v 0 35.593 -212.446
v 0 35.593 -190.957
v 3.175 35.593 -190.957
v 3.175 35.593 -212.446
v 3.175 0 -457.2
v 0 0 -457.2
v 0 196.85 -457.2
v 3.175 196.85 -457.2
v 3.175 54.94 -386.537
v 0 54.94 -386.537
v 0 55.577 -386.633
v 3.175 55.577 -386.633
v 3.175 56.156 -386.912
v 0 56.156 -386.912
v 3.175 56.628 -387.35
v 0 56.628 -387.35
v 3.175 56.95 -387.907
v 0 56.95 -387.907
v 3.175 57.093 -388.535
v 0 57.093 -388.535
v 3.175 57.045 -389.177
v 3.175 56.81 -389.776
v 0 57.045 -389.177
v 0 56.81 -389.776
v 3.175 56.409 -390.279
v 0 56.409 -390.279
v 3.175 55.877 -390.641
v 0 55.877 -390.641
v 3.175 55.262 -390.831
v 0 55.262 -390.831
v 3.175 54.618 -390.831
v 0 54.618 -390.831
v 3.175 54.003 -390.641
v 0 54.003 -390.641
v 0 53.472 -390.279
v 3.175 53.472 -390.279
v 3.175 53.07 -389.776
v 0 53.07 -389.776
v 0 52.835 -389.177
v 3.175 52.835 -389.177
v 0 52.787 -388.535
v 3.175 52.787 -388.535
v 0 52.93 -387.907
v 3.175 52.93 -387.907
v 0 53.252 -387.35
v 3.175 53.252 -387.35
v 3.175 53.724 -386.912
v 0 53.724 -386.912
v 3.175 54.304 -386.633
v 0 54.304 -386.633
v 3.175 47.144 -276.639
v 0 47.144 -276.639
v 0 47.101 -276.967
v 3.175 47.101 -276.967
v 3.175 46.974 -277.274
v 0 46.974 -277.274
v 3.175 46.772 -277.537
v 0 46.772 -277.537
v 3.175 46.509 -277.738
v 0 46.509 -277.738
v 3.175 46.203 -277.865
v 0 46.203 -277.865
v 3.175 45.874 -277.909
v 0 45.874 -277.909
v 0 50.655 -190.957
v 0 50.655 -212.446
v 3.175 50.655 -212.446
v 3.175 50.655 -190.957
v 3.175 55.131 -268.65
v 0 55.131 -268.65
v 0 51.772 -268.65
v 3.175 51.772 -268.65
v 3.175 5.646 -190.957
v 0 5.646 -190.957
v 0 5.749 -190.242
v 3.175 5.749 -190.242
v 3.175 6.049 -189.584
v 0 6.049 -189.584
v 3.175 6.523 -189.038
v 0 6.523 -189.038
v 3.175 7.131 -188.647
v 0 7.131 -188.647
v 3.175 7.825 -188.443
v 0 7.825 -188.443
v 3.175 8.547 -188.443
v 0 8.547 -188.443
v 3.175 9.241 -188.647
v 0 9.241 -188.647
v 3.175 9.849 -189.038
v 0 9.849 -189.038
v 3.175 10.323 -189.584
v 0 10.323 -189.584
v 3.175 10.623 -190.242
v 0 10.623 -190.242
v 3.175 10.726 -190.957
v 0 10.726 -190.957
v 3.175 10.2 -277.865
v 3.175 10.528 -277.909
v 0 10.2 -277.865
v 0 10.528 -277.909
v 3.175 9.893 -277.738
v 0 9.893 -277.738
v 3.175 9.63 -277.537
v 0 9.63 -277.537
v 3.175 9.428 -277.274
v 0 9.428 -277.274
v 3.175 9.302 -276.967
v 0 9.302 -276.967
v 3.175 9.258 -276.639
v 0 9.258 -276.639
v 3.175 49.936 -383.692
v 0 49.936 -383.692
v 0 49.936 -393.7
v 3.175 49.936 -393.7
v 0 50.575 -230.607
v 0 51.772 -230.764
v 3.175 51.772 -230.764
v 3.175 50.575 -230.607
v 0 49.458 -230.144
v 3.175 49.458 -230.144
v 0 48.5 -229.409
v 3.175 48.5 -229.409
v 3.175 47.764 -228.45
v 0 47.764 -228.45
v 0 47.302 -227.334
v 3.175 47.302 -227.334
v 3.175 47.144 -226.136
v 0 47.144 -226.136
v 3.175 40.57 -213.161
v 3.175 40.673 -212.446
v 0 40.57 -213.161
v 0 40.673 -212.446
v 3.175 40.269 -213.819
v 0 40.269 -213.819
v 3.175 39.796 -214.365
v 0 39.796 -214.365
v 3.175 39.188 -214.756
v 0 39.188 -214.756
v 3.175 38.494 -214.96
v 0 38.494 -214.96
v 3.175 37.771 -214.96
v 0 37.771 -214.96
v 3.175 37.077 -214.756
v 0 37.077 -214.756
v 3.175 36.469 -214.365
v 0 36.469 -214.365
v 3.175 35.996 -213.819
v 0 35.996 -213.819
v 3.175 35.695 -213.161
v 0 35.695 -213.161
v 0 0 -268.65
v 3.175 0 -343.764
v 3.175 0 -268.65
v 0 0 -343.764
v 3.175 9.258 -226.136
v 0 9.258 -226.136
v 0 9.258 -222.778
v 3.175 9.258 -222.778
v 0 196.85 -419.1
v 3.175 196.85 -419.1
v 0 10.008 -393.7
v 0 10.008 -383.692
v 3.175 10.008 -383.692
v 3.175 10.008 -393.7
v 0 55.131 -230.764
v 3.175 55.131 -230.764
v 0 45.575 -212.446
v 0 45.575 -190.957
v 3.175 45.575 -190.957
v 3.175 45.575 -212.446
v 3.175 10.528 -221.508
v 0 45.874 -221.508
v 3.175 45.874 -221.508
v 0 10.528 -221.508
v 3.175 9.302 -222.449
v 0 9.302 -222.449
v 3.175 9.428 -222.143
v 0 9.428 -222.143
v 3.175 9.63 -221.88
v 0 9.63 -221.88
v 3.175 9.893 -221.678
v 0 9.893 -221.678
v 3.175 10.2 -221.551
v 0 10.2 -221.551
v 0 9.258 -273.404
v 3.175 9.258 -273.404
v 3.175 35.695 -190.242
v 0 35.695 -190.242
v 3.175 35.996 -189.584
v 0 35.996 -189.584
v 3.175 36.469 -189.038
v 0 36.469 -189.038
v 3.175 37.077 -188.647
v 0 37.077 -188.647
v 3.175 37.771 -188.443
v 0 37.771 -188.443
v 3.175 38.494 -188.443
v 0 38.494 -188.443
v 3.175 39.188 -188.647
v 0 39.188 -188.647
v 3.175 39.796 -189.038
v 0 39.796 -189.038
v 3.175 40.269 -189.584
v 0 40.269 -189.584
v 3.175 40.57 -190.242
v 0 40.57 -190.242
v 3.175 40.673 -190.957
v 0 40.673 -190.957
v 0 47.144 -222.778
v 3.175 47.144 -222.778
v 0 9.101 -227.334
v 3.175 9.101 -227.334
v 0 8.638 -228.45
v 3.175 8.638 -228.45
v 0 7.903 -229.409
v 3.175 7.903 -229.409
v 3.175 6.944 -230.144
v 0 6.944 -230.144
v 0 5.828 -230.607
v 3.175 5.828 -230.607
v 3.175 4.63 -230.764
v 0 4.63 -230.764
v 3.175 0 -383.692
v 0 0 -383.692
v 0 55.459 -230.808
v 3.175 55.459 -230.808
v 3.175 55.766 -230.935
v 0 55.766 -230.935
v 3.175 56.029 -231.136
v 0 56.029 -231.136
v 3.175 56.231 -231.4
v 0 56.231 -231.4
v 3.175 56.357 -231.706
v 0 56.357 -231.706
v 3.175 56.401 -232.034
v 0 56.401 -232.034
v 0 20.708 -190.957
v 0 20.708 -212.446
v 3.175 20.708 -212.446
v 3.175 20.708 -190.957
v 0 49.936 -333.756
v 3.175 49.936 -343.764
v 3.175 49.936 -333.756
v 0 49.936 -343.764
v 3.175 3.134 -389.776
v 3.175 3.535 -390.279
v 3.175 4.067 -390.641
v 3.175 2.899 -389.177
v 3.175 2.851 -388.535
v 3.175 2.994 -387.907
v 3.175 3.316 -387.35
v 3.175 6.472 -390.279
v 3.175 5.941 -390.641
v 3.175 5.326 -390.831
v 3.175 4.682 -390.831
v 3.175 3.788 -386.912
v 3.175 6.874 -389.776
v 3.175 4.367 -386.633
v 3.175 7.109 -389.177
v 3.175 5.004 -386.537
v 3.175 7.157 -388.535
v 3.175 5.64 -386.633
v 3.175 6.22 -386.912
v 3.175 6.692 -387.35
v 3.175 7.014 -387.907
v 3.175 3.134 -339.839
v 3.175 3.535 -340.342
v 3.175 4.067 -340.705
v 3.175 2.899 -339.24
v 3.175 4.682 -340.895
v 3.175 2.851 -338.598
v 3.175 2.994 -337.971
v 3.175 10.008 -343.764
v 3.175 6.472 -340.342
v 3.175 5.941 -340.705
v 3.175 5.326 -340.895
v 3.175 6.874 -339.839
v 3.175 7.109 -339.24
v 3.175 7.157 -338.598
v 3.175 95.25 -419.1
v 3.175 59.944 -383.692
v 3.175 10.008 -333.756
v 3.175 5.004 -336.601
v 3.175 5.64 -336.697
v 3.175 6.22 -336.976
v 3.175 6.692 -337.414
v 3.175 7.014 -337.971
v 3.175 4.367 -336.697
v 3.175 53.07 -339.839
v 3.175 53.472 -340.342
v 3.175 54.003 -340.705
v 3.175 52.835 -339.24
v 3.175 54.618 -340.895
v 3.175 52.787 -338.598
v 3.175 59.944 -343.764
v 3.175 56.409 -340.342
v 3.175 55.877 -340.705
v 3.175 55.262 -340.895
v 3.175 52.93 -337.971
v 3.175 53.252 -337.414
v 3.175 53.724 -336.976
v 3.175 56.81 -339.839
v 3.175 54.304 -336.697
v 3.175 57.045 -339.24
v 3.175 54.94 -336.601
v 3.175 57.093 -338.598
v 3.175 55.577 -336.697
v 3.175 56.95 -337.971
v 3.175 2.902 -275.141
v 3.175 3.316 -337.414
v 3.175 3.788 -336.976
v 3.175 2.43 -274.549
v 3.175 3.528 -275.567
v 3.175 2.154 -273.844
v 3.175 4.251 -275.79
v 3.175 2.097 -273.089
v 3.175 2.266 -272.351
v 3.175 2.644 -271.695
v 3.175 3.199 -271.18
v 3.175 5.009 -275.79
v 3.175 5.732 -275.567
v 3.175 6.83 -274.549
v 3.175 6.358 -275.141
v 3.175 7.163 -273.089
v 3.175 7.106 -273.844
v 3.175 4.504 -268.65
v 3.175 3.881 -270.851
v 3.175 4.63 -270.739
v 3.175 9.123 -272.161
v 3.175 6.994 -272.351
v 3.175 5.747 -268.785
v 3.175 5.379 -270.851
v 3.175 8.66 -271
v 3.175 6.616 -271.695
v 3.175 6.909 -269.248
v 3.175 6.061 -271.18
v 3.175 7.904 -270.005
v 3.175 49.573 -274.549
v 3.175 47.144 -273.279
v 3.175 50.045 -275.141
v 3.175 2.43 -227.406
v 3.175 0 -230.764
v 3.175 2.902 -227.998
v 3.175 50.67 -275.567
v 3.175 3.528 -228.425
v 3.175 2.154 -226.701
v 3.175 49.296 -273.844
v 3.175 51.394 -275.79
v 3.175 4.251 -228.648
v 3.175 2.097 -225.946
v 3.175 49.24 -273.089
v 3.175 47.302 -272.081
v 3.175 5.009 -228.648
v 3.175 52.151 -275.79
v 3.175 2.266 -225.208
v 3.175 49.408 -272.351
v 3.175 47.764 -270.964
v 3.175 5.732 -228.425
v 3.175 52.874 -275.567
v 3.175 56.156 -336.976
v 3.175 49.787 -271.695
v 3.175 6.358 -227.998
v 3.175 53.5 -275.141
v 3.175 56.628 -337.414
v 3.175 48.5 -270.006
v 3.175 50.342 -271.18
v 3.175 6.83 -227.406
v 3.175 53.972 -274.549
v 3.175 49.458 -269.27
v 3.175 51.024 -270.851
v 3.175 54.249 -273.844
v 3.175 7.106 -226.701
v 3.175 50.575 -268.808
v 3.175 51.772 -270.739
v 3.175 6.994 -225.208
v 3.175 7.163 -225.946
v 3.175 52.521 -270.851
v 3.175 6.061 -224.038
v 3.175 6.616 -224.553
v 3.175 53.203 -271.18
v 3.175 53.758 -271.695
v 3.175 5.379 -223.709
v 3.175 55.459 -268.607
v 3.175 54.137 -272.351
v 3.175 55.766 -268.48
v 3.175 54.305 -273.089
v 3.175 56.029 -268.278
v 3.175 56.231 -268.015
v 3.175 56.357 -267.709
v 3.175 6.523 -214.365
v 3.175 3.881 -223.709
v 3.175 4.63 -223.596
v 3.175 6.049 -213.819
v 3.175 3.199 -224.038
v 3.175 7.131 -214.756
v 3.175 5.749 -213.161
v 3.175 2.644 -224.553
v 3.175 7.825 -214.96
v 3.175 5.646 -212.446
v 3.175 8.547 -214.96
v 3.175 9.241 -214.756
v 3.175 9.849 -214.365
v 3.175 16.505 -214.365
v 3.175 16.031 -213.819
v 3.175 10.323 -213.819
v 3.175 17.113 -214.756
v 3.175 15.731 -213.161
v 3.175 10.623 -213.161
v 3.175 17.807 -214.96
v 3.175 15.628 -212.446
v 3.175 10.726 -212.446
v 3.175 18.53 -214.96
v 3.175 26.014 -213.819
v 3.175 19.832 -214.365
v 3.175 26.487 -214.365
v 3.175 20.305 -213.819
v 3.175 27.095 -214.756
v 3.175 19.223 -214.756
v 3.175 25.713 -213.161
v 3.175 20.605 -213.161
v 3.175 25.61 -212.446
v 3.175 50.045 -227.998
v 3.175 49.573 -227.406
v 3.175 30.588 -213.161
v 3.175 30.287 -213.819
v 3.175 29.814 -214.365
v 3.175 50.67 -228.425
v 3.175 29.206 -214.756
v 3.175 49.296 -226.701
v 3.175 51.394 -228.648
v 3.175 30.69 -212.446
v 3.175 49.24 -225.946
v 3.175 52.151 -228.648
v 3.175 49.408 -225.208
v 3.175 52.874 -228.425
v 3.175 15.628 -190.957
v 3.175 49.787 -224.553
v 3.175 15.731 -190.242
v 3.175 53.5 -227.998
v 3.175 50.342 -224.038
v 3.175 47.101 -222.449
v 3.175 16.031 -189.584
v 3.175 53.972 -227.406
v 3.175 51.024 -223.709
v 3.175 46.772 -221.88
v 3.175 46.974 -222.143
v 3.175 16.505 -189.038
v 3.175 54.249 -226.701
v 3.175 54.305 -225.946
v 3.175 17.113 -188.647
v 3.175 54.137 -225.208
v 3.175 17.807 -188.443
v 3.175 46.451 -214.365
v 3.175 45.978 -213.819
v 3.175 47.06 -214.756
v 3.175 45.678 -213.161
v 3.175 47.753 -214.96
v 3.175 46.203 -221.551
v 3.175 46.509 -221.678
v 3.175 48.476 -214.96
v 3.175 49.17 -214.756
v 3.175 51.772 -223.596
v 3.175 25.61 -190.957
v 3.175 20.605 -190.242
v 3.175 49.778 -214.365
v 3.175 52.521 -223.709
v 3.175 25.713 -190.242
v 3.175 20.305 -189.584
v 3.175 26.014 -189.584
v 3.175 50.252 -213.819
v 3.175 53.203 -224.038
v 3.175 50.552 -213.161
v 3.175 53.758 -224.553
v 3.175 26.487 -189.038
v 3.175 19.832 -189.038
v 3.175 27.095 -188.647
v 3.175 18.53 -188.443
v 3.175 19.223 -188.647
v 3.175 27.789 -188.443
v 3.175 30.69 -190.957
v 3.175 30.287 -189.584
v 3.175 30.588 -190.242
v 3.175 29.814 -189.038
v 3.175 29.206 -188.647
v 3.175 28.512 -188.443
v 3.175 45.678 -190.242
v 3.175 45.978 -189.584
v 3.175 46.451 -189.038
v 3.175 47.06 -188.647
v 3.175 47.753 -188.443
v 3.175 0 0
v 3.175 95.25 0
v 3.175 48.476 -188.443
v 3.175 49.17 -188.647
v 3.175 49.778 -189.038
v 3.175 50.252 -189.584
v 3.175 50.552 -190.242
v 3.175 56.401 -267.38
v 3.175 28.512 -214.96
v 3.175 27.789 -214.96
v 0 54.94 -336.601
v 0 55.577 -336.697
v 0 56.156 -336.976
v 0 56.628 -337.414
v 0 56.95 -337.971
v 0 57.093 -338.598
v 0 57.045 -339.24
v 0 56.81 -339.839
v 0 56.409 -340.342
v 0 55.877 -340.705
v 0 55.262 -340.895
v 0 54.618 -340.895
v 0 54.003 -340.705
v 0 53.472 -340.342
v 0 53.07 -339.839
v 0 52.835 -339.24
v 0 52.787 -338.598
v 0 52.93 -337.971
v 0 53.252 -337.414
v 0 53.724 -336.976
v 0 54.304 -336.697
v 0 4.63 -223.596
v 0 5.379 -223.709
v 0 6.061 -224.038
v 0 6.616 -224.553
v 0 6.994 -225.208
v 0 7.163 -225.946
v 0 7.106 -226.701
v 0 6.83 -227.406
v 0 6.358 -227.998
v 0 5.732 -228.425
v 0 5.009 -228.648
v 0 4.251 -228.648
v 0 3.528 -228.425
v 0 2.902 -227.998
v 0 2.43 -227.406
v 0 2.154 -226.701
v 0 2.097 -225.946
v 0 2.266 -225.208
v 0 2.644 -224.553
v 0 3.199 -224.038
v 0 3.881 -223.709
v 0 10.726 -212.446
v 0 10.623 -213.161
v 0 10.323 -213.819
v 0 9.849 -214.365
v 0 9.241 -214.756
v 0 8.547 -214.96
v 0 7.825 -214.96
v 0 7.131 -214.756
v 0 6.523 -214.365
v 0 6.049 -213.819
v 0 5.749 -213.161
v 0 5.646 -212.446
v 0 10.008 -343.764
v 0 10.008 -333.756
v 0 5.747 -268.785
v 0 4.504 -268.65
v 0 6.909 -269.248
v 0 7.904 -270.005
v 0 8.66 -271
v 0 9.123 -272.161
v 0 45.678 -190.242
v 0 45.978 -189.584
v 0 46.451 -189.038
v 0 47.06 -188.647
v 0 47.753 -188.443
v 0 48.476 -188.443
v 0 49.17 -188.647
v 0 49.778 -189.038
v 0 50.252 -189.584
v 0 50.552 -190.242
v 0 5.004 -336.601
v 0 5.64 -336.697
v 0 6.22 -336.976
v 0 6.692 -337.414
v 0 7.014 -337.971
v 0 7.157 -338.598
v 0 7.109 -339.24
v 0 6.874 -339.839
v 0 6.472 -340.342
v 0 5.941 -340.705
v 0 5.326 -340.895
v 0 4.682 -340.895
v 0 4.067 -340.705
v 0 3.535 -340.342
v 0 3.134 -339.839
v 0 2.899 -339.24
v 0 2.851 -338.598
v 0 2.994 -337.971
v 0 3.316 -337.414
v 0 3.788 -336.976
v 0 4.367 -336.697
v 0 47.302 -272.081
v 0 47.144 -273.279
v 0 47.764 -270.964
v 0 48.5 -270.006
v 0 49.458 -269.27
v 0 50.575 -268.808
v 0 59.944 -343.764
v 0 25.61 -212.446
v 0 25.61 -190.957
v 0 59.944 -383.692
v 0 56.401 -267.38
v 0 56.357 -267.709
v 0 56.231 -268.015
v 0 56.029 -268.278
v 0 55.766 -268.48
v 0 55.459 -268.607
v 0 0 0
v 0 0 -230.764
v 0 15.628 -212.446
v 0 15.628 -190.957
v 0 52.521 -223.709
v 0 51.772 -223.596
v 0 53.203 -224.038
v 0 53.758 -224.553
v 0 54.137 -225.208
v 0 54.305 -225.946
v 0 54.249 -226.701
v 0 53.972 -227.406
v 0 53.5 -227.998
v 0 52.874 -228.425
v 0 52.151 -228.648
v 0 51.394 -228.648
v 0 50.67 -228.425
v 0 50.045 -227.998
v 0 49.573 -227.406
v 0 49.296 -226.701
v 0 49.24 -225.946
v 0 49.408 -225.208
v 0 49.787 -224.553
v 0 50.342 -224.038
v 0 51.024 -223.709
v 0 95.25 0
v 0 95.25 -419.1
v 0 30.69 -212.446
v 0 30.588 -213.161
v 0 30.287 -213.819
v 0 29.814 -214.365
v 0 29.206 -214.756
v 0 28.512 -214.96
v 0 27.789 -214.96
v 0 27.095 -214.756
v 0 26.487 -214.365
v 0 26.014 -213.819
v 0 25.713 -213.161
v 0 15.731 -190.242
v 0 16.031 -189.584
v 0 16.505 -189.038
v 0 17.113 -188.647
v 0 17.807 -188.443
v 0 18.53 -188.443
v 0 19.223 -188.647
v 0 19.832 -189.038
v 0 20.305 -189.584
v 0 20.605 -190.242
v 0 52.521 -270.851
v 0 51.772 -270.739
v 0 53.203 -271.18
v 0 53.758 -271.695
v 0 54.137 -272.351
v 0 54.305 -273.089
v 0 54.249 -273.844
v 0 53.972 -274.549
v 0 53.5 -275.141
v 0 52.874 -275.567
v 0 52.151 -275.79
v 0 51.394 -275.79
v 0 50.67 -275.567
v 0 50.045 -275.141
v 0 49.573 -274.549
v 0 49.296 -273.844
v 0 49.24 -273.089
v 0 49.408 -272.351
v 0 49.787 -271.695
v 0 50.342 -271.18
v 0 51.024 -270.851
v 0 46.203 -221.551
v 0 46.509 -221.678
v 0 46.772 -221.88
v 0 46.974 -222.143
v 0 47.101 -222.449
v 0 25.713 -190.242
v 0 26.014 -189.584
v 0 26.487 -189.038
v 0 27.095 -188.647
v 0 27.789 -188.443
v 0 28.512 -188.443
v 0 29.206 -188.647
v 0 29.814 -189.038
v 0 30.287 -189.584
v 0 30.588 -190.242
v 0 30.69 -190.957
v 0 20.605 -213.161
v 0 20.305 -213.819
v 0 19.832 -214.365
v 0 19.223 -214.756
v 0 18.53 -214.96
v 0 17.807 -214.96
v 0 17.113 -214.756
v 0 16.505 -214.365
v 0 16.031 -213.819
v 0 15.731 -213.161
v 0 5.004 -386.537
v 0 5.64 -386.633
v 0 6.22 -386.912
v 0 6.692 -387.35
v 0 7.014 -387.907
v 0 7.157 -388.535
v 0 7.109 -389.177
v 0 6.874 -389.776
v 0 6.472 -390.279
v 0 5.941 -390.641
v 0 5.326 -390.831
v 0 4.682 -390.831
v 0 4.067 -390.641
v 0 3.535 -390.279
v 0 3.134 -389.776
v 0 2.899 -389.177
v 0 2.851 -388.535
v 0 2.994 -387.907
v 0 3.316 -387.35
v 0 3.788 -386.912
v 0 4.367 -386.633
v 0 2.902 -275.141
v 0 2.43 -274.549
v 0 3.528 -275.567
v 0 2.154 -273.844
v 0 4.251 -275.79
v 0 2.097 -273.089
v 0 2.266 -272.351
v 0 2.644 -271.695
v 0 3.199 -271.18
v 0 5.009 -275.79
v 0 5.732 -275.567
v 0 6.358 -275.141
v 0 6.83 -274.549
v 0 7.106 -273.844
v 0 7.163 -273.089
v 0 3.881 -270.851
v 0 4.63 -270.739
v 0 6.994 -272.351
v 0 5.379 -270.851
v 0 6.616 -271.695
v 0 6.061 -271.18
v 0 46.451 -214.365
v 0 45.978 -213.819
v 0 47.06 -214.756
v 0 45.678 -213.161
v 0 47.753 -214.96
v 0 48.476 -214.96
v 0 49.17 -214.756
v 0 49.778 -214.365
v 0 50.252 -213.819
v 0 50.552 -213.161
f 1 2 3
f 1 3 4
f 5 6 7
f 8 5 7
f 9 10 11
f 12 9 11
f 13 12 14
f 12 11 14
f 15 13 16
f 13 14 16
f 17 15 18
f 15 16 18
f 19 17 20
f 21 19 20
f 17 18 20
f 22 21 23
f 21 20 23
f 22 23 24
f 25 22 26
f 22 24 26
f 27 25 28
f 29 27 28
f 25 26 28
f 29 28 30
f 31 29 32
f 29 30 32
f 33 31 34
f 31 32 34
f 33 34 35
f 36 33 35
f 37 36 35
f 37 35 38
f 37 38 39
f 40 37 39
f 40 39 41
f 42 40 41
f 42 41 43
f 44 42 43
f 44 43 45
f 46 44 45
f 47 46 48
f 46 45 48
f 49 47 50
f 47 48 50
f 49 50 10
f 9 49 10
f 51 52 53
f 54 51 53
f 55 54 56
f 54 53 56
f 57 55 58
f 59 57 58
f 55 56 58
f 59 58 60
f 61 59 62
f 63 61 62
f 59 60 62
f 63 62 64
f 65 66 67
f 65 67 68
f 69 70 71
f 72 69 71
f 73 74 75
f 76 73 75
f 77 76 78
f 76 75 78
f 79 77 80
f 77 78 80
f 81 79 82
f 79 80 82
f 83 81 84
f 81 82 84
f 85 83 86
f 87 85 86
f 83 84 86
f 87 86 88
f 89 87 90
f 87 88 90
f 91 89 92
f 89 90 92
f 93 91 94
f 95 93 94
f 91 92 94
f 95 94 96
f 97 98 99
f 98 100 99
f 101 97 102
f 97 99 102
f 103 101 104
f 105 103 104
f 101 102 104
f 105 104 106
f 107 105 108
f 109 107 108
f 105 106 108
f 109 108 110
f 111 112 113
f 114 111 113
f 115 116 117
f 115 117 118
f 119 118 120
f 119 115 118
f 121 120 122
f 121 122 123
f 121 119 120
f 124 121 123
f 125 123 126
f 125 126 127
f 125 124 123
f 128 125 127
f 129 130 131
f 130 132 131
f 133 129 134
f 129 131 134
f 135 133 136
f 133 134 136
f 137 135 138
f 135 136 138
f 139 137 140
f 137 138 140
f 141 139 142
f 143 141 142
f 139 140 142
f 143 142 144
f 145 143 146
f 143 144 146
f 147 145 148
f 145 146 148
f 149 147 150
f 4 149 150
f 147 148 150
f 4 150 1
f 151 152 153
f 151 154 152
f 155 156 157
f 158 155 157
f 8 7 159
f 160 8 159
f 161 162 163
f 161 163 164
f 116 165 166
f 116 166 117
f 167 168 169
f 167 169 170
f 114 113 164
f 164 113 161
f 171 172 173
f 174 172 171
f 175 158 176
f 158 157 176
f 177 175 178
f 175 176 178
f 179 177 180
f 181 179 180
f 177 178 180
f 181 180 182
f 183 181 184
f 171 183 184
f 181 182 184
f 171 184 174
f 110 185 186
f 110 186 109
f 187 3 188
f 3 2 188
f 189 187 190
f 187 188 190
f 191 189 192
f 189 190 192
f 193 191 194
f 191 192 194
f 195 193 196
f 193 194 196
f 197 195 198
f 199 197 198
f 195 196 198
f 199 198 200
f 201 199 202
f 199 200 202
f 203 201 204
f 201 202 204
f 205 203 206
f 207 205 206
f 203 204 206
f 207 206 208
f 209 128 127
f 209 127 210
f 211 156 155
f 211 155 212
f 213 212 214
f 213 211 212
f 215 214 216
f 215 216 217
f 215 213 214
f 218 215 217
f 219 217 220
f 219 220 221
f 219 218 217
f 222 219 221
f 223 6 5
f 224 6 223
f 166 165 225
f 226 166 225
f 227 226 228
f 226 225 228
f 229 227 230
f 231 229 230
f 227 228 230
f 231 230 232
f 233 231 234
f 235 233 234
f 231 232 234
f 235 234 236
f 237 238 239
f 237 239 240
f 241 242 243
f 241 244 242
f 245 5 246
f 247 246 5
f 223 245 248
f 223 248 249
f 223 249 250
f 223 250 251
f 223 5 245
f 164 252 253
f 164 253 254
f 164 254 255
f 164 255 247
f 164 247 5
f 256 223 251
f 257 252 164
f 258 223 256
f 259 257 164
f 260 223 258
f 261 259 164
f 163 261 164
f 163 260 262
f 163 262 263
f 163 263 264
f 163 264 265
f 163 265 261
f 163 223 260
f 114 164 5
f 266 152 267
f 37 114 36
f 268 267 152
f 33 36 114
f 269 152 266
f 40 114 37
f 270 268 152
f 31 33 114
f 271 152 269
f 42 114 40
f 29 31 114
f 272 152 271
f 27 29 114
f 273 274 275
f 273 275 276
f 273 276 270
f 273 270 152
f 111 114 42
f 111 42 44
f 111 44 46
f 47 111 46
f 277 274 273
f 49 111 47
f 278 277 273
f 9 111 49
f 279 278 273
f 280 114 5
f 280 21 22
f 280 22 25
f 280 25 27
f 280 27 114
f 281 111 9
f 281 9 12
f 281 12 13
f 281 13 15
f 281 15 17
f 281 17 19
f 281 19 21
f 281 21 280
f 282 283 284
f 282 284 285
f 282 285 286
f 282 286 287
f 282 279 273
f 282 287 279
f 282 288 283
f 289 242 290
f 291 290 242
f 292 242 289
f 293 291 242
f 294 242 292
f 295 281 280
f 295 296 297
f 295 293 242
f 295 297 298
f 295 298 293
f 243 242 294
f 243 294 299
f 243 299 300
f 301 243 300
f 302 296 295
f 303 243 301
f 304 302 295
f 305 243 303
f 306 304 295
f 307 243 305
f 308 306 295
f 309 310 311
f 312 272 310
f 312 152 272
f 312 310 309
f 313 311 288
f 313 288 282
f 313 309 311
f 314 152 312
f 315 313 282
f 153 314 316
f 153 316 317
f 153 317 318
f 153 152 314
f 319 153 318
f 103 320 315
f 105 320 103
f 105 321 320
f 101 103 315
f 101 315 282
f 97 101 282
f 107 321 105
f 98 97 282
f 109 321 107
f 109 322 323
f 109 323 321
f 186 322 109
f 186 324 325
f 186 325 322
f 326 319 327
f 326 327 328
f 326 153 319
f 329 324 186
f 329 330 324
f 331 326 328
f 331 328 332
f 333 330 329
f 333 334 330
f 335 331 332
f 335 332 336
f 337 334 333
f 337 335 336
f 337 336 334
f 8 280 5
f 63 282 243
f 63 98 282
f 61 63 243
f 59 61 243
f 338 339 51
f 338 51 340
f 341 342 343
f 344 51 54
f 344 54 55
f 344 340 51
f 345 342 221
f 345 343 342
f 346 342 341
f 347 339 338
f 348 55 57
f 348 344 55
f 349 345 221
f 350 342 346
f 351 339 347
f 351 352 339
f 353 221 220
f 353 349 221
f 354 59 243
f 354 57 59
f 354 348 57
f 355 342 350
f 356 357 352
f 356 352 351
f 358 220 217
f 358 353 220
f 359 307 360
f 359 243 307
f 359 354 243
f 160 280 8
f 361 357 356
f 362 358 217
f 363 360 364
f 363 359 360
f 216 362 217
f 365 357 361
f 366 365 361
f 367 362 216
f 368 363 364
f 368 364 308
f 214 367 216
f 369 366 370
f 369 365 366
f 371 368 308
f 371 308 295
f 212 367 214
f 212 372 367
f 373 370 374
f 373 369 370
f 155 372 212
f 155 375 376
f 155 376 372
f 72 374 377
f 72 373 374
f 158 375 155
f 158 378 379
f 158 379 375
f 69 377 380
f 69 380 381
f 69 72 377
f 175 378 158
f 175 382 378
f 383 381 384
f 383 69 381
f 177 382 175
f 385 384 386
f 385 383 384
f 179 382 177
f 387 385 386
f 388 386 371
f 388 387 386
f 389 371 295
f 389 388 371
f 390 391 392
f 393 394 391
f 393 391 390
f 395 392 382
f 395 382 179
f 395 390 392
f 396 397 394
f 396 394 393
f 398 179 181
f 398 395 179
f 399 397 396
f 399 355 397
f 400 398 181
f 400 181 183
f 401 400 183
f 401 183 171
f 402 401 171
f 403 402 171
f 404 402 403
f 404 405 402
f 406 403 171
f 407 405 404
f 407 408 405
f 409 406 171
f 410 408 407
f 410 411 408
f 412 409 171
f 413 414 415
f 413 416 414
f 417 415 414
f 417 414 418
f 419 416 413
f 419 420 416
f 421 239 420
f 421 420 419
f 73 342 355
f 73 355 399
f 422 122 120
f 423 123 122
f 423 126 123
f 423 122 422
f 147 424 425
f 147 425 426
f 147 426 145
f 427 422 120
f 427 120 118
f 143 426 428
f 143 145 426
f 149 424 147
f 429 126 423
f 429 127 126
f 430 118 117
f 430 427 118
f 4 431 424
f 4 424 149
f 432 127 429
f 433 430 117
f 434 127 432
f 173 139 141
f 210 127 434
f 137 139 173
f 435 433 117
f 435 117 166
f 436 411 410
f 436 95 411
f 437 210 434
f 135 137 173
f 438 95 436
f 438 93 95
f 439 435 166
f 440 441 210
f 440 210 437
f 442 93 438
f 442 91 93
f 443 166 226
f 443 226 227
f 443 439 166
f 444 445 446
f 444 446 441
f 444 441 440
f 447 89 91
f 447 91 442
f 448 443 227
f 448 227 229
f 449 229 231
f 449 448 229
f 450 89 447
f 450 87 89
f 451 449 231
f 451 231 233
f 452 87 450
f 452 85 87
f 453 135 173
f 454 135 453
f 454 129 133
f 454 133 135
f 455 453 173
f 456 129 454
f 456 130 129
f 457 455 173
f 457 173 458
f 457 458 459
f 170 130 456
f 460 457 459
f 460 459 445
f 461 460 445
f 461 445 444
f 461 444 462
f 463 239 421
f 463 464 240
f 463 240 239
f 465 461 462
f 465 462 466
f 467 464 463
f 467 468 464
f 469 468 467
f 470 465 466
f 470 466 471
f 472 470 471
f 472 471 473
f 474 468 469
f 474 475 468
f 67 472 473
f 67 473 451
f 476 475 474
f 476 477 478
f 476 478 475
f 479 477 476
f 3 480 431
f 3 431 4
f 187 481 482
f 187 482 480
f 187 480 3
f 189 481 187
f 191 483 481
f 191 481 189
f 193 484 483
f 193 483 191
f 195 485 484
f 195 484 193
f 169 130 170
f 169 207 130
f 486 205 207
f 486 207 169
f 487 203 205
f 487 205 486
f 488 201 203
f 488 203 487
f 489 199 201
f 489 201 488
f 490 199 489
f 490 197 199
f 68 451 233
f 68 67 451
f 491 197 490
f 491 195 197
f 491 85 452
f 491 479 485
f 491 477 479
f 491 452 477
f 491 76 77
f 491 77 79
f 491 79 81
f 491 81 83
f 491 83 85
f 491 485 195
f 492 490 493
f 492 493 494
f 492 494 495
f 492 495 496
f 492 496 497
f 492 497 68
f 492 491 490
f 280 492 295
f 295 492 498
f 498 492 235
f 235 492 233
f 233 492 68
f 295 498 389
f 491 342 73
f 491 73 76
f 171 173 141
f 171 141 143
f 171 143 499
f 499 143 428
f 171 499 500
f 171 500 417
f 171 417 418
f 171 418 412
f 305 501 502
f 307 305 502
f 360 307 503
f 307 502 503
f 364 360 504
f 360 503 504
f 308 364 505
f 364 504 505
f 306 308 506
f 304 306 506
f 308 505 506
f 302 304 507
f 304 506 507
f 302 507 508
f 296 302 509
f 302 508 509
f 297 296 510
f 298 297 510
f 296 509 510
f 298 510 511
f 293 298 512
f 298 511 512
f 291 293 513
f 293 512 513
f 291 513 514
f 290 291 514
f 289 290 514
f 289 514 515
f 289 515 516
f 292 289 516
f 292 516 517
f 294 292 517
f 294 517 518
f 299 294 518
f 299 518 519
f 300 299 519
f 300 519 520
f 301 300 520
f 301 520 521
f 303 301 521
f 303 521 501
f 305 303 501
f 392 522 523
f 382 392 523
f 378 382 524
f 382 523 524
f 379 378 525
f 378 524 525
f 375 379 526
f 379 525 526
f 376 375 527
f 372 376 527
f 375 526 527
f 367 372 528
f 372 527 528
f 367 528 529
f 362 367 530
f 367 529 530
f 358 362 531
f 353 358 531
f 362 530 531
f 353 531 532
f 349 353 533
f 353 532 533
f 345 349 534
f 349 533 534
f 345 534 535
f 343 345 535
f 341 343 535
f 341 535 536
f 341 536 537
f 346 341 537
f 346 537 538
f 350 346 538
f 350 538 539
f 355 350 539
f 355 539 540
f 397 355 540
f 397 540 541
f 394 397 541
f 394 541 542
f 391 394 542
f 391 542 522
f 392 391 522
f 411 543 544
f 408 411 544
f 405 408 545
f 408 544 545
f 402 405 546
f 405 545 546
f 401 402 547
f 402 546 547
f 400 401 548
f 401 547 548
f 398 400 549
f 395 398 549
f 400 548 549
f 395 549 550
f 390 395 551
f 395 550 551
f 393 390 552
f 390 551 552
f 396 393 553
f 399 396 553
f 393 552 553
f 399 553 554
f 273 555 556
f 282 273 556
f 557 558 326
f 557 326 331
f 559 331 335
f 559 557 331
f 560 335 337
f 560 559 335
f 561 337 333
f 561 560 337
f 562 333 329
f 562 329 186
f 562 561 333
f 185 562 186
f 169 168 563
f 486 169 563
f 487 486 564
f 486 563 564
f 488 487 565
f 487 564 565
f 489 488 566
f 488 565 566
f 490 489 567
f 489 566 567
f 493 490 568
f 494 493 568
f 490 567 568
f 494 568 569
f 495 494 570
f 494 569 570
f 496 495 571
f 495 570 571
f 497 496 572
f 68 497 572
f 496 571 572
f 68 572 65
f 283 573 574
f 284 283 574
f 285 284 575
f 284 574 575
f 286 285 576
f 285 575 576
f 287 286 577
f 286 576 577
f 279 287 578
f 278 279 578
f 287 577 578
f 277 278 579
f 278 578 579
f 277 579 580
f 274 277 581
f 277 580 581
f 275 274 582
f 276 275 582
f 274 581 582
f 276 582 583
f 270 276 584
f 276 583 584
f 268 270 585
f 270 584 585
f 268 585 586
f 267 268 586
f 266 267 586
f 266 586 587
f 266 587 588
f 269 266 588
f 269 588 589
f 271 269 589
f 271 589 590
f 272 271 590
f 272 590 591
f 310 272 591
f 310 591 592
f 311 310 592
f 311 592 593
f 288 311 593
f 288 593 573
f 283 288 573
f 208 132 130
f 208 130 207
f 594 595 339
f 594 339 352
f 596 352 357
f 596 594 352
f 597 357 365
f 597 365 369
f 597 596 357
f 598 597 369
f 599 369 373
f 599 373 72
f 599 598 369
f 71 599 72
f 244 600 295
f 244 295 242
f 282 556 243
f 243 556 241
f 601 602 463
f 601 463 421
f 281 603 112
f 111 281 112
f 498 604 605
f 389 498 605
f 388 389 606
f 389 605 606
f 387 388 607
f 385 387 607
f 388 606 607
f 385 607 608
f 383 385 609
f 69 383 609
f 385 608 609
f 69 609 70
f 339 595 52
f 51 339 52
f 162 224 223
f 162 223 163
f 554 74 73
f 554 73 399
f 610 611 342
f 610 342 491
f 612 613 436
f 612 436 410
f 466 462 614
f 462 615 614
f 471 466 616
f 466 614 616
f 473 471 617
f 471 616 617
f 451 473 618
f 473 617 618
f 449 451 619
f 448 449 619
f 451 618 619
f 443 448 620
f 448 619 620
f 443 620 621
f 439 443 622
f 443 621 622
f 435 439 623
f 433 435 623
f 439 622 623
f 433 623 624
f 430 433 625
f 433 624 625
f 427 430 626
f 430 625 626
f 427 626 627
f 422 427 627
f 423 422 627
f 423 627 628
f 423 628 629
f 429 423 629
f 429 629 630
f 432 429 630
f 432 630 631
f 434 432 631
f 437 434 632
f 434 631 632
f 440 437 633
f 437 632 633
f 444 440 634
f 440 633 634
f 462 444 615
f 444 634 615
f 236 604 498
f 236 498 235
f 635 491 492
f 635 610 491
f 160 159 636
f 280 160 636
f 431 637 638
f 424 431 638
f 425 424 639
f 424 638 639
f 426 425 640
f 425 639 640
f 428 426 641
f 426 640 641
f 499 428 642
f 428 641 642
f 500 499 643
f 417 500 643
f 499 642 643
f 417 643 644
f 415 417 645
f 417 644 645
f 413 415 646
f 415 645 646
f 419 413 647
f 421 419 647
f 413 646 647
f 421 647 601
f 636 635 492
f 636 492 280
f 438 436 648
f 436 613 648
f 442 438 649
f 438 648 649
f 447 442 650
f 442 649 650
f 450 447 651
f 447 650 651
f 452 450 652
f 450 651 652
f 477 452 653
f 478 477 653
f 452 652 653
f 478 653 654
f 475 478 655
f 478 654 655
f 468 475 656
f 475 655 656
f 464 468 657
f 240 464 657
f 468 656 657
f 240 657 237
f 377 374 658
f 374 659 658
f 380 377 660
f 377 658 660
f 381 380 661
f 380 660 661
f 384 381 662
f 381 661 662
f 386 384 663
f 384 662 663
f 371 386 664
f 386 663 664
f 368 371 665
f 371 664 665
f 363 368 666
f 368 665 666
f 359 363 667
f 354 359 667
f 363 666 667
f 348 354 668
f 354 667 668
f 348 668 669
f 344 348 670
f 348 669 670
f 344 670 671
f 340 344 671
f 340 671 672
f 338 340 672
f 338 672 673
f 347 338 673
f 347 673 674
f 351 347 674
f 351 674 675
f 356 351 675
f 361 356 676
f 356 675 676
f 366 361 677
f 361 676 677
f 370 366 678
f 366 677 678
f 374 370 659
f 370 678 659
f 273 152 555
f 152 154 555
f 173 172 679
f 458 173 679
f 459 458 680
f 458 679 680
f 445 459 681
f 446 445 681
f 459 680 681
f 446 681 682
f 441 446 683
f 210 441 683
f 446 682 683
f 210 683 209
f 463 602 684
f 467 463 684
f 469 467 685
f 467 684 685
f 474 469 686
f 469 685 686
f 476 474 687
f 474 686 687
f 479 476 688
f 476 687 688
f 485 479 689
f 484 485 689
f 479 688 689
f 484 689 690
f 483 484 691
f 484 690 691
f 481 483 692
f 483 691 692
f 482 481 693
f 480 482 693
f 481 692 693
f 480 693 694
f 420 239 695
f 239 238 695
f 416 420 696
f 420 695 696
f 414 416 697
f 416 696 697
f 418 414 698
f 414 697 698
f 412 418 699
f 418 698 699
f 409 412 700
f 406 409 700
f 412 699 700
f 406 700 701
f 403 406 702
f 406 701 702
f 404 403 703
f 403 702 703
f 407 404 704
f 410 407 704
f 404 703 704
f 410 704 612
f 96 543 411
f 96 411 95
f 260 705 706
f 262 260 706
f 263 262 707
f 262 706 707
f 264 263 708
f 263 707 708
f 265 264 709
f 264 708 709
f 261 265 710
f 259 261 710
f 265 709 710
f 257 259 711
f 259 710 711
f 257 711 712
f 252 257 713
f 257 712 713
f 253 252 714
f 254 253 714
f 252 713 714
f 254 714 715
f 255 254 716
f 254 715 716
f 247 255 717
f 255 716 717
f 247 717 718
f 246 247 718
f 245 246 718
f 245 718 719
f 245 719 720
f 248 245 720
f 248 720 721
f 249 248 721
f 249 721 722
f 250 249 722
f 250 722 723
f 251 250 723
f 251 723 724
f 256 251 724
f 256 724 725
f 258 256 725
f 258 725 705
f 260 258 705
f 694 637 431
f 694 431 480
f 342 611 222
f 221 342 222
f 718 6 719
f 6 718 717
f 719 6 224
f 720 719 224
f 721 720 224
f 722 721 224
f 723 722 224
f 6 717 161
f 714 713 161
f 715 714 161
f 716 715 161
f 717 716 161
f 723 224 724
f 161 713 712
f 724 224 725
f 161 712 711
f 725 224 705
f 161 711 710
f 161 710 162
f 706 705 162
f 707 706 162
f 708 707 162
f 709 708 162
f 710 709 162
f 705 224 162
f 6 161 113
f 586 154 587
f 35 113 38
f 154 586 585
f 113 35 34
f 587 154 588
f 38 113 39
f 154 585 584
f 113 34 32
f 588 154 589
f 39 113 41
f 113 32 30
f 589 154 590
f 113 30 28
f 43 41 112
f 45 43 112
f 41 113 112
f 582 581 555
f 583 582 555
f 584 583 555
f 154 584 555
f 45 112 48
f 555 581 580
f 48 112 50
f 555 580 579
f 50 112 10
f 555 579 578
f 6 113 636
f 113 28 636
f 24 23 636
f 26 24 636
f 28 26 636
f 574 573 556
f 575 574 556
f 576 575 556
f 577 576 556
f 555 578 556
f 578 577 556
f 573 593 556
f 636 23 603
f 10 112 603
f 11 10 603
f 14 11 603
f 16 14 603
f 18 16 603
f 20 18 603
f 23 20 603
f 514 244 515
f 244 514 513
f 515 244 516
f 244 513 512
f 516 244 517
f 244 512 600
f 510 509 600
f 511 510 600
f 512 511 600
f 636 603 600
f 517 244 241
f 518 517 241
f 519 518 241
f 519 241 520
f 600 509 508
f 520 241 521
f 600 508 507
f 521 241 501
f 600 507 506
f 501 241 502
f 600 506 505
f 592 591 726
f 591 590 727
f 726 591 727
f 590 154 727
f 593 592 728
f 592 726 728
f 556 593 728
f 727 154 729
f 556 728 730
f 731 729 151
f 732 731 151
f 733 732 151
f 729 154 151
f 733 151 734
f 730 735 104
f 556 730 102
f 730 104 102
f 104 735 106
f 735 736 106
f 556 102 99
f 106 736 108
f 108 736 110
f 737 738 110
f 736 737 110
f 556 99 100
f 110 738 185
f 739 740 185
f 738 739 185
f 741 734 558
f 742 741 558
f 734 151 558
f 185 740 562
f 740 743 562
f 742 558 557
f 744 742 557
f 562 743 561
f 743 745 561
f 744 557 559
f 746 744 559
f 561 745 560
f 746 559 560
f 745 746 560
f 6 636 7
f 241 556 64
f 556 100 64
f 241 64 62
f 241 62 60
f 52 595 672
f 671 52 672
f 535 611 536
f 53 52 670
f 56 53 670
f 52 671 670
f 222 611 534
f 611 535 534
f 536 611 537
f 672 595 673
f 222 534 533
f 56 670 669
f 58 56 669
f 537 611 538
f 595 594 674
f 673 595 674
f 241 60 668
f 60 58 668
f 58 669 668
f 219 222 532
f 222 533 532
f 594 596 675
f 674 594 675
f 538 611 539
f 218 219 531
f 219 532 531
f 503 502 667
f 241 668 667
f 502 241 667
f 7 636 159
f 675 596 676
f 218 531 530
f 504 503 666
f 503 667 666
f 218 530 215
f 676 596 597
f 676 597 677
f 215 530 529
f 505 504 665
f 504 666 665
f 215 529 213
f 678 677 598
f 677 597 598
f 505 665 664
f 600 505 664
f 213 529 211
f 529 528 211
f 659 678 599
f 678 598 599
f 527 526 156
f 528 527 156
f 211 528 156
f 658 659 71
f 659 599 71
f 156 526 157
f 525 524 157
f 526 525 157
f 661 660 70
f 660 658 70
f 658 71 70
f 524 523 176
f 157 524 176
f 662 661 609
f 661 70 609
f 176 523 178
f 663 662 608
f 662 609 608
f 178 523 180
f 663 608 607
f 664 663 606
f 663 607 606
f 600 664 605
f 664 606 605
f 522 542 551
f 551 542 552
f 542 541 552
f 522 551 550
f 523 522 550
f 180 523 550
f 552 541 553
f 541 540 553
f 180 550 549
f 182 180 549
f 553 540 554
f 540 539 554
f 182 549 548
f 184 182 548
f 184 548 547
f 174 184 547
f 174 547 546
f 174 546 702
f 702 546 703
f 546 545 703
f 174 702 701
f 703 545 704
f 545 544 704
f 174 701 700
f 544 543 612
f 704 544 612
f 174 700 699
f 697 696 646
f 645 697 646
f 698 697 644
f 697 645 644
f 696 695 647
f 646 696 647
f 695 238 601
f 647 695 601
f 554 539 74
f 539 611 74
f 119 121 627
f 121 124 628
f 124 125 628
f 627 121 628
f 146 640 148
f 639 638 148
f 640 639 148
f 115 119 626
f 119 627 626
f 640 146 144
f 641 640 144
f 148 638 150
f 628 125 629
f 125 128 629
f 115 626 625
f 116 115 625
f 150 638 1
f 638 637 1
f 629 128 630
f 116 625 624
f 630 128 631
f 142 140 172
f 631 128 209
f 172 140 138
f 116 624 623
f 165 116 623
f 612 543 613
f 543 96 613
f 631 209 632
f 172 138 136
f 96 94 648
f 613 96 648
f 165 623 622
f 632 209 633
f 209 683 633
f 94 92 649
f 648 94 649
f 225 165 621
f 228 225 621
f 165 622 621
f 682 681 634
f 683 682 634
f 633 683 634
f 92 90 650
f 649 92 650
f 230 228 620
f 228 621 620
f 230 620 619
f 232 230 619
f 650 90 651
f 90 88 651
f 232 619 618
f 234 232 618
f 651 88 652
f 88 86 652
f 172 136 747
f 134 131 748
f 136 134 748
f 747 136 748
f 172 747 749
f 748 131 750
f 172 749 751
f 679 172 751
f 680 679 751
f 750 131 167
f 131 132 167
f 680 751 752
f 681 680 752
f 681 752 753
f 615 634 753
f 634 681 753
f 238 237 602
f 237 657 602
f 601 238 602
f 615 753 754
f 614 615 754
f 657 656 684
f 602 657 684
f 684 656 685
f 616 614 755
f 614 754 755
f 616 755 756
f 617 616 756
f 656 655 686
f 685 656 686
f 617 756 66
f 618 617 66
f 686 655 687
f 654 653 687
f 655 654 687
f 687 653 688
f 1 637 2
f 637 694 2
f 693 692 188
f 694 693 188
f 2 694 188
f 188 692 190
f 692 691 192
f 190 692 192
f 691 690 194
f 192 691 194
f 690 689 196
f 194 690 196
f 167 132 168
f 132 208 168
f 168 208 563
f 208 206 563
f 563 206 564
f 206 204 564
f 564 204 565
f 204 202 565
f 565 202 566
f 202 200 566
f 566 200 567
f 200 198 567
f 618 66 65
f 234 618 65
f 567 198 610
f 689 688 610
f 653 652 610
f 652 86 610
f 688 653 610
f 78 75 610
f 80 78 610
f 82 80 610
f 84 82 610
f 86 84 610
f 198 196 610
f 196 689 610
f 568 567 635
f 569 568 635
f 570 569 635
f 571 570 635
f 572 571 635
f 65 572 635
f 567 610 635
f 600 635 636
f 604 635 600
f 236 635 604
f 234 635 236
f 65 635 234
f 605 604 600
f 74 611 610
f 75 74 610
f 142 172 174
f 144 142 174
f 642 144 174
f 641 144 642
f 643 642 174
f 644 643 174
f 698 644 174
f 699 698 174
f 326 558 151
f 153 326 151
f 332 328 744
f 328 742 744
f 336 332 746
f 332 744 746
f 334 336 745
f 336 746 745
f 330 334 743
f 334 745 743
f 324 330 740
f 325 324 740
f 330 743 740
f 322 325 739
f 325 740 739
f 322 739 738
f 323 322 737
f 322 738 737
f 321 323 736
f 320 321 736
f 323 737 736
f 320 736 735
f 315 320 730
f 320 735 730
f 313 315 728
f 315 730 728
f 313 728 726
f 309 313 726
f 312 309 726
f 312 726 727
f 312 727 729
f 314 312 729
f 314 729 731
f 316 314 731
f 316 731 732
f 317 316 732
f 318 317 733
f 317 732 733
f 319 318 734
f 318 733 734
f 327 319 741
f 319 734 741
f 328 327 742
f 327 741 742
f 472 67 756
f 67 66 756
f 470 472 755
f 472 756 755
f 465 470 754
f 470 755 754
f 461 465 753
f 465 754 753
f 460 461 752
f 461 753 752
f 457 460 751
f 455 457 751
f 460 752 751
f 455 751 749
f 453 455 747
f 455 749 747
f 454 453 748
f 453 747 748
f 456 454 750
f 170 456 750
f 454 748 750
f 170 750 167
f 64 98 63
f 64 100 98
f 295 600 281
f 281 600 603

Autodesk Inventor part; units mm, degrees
ref_plane "YZ Plane" through (0, 0, 0) normal (1, 0, 0) x (0, 1, 0)
ref_plane "XZ Plane" through (0, 0, 0) normal (0, 1, 0) x (-1, 0, 0)
ref_plane "XY Plane" through (0, 0, 0) normal (0, 0, 1) x (1, 0, 0)
sketch "Sketch1" plane through (0, 0, 0) normal (1, 0, 0) x (0, 1, 0)
  line L0 (0, 0) -> (95.25, 0)
  line L1 (95.25, 0) -> (95.25, -419.1)
  line L2 (95.25, -457.2) -> (0, -457.2)
  line L3 (0, -457.2) -> (0, 0)
  line L4 (0, -457.2) -> (196.85, -457.2)
  line L5 (196.85, -457.2) -> (196.85, -419.1)
  line L6 (196.85, -419.1) -> (95.25, -419.1)
  line L7 (0, -419.1) -> (0, -457.2)
extrude "Extrusion1" add sketch "Sketch1" along normal blind 3.175
sketch "Sketch2" plane through (0, 0, 0) normal (-1, 0, 0) x (0, 0, 1)
  line L0 (-393.7, 49.9364) -> (-393.7, 10.0076)
  line L1 (-333.756, 10.0076) -> (-333.756, 49.9364)
  line L2 (-343.7636, 59.944) -> (-383.6924, 59.944)
  circle A0 centre (-388.6962, 54.9402) radius 2.159
  circle A1 centre (-338.7598, 54.9402) radius 2.159
  circle A2 centre (-388.6962, 5.0038) radius 2.159
  circle A3 centre (-338.7598, 5.0038) radius 2.159
  line L3 (-383.6924, 59.944) -> (-383.6924, 49.9364)
  line L4 (-383.6924, 49.9364) -> (-393.7, 49.9364)
  line L5 (-343.7636, 59.944) -> (-343.7636, 49.9364)
  line L6 (-343.7636, 49.9364) -> (-333.756, 49.9364)
  line L7 (-383.6924, 0) -> (-383.6924, 10.0076)
  line L8 (-383.6924, 10.0076) -> (-393.7, 10.0076)
  line L9 (-343.7636, 0) -> (-343.7636, 10.0076)
  line L10 (-343.7636, 10.0076) -> (-333.756, 10.0076)
  circle A4 centre (-273.2786, 51.7724) radius 2.54
  circle A5 centre (-273.2786, 4.63) radius 2.54
  circle A6 centre (-226.1362, 51.7724) radius 2.54
  circle A7 centre (-226.1362, 4.63) radius 2.54
  line L11 (-190.9572, 5.646) -> (-212.4456, 5.646)
  line L12 (-212.4456, 10.726) -> (-190.9572, 10.726)
  arc A8 (-190.9572, 5.646) -> (-190.9572, 10.726) centre (-190.9572, 8.186) ccw
  arc A9 (-212.4456, 10.726) -> (-212.4456, 5.646) centre (-212.4456, 8.186) ccw
  line L13 (-190.9572, 15.6282) -> (-212.4456, 15.6282)
  line L14 (-212.4456, 20.7082) -> (-190.9572, 20.7082)
  arc A10 (-190.9572, 15.6282) -> (-190.9572, 20.7082) centre (-190.9572, 18.1682) ccw
  arc A11 (-212.4456, 20.7082) -> (-212.4456, 15.6282) centre (-212.4456, 18.1682) ccw
  line L15 (-190.9572, 25.6104) -> (-212.4456, 25.6104)
  line L16 (-212.4456, 30.6904) -> (-190.9572, 30.6904)
  arc A12 (-190.9572, 25.6104) -> (-190.9572, 30.6904) centre (-190.9572, 28.1504) ccw
  arc A13 (-212.4456, 30.6904) -> (-212.4456, 25.6104) centre (-212.4456, 28.1504) ccw
  line L17 (-190.9572, 35.5926) -> (-212.4456, 35.5926)
  line L18 (-212.4456, 40.6726) -> (-190.9572, 40.6726)
  arc A14 (-190.9572, 35.5926) -> (-190.9572, 40.6726) centre (-190.9572, 38.1326) ccw
  arc A15 (-212.4456, 40.6726) -> (-212.4456, 35.5926) centre (-212.4456, 38.1326) ccw
  line L19 (-190.9572, 45.5748) -> (-212.4456, 45.5748)
  line L20 (-212.4456, 50.6548) -> (-190.9572, 50.6548)
  arc A16 (-190.9572, 45.5748) -> (-190.9572, 50.6548) centre (-190.9572, 48.1148) ccw
  arc A17 (-212.4456, 50.6548) -> (-212.4456, 45.5748) centre (-212.4456, 48.1148) ccw
  line L21 (-457.2, 0) -> (-457.2, 196.85) projected
  line L22 (-457.2, 0) -> (-393.7, 0)
  line L23 (-383.6924, 0) -> (-343.7636, 0)
  line L24 (-419.1, 95.25) -> (0, 95.25) projected
  line L25 (-4.8028, 0) -> (-4.8028, 95.25)
  line L26 (-4.8028, 95.25) -> (-457.2, 95.25)
  line L27 (-457.2, 95.25) -> (-457.2, 0)
  line L28 (-267.3803, 56.4007) -> (-232.0345, 56.4007)
  line L29 (-221.5079, 45.8741) -> (-221.5079, 10.5283)
  line L30 (-232.0345, 0) -> (-267.3803, 0)
  line L31 (-277.9086, 10.5283) -> (-277.9086, 45.8741)
  line L32 (-273.2786, 51.7724) -> (-271.5234, 49.9364)
  line L33 (-271.5234, 49.9364) -> (-270.4878, 48.8532)
  arc A18 (-268.6503, 4.5045) -> (-273.4041, 9.2583) centre (-273.2786, 4.63) ccw
  arc A19 (-226.1362, 9.2583) -> (-230.7645, 4.63) centre (-226.1362, 4.63) ccw
  arc A20 (-230.7645, 51.7724) -> (-226.1362, 47.1441) centre (-226.1362, 51.7724) ccw
  arc A21 (-273.2786, 47.1441) -> (-268.6503, 51.7724) centre (-273.2786, 51.7724) ccw
  line L34 (-268.6503, 55.1307) -> (-268.6503, 51.7724)
  line L35 (-273.2786, 47.1441) -> (-276.6386, 47.1441)
  line L36 (-230.7645, 55.1307) -> (-230.7645, 51.7724)
  line L37 (-226.1362, 47.1441) -> (-222.7779, 47.1441)
  line L38 (-221.5079, 0) -> (-230.7645, 0)
  line L39 (-230.7645, 1.27) -> (-230.7645, 4.63)
  line L40 (-226.1362, 9.2583) -> (-222.7779, 9.2583)
  line L41 (-277.9086, 0) -> (-268.6503, 0)
  line L42 (-268.6503, 1.27) -> (-268.6503, 4.7555)
  line L43 (-273.1531, 9.2583) -> (-276.6386, 9.2583)
  arc A22 (-277.9086, 10.5283) -> (-276.6386, 9.2583) centre (-276.6386, 10.5283) ccw
  arc A23 (-267.3803, 56.4007) -> (-268.6503, 55.1307) centre (-267.3803, 55.1307) ccw
  arc A24 (-276.6386, 47.1441) -> (-277.9086, 45.8741) centre (-276.6386, 45.8741) ccw
  arc A25 (-230.7645, 55.1307) -> (-232.0345, 56.4007) centre (-232.0345, 55.1307) ccw
  arc A26 (-221.5079, 45.8741) -> (-222.7779, 47.1441) centre (-222.7779, 45.8741) ccw
  arc A27 (-222.7779, 9.2583) -> (-221.5079, 10.5283) centre (-222.7779, 10.5283) ccw
  line L44 (-277.9086, 56.4007) -> (-277.7032, 56.4007)
  line L45 (-268.6503, 4.5045) -> (-268.6503, 0)
  line L46 (0, 0) -> (-457.2, 0) projected
  line L47 (-230.7645, 4.63) -> (-230.7645, 0)
  line L48 (-268.6503, 0) -> (-230.7645, 0)
  dimension "d50" = 1.4986
  dimension "d52" = 1.27
extrude "Extrusion2" cut sketch "Sketch2" against normal blind 25.4 contours L4 L3 L2 L5 L6 L1 L10 L9 L23 L7 L8 L0 | L45 L42 A18 L43 A22 L31 A24 L35 A21 L34 A23 L28 A25 L36 A20 L37 A26 L29 A27 L40 A19 L39 L47 L46 L30 | A0 | A1 | A2 | A3 | A4 | A5 | A6 | A7 | L11 A9 L12 A8 | L13 A11 L14 A10 | L15 A13 L16 A12 | L17 A15 L18 A14 | L19 A17 L20 A16
sketch "Sketch6" plane through (3.175, 0, 0) normal (1, 0, 0) x (0, 0, -1)
  point P0 (0, 0)
properties part number "220228 Left Side with brace"
